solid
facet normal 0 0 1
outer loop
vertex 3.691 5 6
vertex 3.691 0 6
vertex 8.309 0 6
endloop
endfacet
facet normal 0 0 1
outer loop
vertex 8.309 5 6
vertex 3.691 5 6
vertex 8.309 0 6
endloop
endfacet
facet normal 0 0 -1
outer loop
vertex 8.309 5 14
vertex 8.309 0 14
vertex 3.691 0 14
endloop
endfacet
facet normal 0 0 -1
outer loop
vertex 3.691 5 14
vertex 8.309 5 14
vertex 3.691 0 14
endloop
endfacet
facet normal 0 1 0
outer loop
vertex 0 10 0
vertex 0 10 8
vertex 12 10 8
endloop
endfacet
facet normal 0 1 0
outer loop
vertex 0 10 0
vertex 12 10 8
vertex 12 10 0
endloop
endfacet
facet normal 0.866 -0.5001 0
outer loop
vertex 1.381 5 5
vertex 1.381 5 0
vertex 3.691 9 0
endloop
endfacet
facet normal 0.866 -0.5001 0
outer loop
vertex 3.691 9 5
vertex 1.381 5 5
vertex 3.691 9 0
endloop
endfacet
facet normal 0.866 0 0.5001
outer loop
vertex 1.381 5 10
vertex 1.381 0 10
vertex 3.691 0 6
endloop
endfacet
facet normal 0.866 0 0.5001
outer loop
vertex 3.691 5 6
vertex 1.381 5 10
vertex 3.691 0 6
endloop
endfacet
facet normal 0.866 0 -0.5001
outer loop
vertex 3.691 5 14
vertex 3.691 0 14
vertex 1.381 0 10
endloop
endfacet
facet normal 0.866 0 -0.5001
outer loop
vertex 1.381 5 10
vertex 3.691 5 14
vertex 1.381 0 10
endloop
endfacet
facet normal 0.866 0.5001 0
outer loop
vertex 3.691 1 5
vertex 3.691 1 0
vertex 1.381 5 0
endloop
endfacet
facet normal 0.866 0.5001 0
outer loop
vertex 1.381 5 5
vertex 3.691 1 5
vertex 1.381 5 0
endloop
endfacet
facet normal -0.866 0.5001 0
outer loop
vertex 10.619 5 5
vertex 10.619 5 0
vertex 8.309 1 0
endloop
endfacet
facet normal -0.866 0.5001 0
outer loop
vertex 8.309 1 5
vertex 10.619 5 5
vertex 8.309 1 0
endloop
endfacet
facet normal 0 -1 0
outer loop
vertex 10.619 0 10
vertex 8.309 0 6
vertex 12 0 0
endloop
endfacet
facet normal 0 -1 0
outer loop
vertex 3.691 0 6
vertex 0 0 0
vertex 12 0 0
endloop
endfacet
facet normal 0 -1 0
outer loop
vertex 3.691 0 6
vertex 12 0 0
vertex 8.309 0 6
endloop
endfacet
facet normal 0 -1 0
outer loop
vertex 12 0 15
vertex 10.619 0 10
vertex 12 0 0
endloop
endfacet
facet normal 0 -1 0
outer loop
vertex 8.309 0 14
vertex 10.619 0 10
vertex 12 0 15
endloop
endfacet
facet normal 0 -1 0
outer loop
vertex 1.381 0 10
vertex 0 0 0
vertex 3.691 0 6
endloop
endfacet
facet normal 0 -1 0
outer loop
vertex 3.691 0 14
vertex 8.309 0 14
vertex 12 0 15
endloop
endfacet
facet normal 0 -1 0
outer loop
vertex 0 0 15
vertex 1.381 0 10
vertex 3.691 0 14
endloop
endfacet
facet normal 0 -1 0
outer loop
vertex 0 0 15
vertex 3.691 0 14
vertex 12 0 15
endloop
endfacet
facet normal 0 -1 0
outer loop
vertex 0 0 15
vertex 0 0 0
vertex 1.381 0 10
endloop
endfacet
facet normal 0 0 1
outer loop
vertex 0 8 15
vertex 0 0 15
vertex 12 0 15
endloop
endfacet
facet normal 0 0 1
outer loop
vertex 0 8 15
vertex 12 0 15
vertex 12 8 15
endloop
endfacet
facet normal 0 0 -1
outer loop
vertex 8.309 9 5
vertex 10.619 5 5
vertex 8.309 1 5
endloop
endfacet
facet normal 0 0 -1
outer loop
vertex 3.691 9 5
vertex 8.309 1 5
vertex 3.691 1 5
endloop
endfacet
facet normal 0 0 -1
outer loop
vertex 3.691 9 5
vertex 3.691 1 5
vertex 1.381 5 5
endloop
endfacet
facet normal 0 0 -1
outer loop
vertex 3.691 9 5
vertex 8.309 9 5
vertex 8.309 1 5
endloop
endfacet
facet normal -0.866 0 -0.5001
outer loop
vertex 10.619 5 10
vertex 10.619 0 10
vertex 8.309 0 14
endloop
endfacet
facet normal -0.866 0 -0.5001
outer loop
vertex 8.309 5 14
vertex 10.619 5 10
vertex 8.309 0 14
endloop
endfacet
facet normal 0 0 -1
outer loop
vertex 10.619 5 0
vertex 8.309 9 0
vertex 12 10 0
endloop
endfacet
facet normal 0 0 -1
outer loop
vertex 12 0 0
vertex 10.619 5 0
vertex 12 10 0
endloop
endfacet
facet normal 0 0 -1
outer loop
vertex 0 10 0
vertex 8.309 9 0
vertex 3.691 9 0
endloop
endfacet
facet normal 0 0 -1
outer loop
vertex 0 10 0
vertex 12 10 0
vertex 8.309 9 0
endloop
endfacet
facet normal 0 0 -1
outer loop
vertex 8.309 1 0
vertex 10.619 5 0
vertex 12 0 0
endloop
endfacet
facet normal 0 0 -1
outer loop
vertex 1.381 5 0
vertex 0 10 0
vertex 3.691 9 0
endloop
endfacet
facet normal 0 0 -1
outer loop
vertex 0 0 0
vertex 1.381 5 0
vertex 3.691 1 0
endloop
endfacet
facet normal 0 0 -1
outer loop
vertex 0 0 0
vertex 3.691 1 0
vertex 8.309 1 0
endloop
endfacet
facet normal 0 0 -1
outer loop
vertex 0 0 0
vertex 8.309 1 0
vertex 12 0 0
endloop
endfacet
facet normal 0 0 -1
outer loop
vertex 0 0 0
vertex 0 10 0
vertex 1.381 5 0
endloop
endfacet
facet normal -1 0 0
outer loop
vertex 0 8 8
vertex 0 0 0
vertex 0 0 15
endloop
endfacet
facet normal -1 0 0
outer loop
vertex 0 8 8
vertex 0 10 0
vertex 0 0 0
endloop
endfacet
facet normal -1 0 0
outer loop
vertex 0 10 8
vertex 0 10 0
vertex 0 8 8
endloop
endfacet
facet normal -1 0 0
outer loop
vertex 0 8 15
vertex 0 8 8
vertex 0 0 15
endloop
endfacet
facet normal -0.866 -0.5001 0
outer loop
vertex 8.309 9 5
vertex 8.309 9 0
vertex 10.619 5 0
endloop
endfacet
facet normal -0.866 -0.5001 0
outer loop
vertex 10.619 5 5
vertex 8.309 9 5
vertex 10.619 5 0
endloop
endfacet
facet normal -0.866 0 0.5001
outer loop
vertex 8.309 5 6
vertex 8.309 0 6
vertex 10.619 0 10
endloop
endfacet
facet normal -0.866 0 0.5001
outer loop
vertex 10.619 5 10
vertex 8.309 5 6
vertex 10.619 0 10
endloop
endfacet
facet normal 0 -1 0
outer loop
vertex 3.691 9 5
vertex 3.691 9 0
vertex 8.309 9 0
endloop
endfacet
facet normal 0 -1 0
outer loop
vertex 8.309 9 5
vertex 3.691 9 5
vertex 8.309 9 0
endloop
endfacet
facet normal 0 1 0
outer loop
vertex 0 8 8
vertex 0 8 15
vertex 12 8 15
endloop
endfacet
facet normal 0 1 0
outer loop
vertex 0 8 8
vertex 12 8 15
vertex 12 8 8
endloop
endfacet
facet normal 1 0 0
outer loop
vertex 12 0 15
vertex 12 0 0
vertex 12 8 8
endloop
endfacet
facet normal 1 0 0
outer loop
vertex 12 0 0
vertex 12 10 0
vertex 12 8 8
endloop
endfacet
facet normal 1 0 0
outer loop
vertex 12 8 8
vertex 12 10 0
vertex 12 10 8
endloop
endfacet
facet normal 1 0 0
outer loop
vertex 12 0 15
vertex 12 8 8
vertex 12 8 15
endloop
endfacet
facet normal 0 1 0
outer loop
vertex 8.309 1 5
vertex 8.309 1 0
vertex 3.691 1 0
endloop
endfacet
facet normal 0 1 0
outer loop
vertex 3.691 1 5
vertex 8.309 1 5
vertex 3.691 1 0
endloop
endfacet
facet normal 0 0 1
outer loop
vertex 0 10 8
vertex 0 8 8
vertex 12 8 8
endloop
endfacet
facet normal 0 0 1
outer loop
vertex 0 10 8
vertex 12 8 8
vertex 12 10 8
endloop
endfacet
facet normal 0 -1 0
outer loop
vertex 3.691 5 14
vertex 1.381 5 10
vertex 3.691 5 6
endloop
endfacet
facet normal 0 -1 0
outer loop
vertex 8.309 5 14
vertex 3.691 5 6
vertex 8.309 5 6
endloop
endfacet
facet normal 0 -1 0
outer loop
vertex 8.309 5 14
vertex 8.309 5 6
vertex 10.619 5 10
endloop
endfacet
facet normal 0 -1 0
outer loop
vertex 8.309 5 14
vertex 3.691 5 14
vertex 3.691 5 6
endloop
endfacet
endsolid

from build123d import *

# Parameters (mm, degrees)
BOSS_EXTRUDE1_DEPTH = 12
CUT_EXTRUDE1_DEPTH  = 5
CUT_EXTRUDE2_DEPTH  = 5


with BuildPart() as part:
    # Sketch2 → Boss-Extrude1 (new body)
    with BuildSketch(Plane(origin=(0, 0, 0), x_dir=(0, 0, -1), z_dir=(1, 0, 0))):
        Polygon((0, 0), (-15, 0), (-15, 8), (-8, 8), (-8, 10), (0, 10), align=None)
    extrude(amount=BOSS_EXTRUDE1_DEPTH)

    # Sketch3 → Cut-Extrude1 (cut)
    with BuildSketch(Plane(origin=(0, 0, 0), x_dir=(-1, 0, 0), z_dir=(0, 0, -1))):
        Polygon((-3.690598923, 9), (-8.309401077, 9), (-10.618802154, 5), (-8.309401077, 1), (-3.690598923, 1), (-1.381197846, 5), align=None)
    extrude(amount=-CUT_EXTRUDE1_DEPTH, mode=Mode.SUBTRACT)

    # Sketch4 → Cut-Extrude2 (cut)
    with BuildSketch(Plane.XZ):
        Polygon((3.690598923, 6), (8.309401077, 6), (10.618802154, 10), (8.309401077, 14), (3.690598923, 14), (1.381197846, 10), align=None)
    extrude(amount=-CUT_EXTRUDE2_DEPTH, mode=Mode.SUBTRACT)


solid = part.part
